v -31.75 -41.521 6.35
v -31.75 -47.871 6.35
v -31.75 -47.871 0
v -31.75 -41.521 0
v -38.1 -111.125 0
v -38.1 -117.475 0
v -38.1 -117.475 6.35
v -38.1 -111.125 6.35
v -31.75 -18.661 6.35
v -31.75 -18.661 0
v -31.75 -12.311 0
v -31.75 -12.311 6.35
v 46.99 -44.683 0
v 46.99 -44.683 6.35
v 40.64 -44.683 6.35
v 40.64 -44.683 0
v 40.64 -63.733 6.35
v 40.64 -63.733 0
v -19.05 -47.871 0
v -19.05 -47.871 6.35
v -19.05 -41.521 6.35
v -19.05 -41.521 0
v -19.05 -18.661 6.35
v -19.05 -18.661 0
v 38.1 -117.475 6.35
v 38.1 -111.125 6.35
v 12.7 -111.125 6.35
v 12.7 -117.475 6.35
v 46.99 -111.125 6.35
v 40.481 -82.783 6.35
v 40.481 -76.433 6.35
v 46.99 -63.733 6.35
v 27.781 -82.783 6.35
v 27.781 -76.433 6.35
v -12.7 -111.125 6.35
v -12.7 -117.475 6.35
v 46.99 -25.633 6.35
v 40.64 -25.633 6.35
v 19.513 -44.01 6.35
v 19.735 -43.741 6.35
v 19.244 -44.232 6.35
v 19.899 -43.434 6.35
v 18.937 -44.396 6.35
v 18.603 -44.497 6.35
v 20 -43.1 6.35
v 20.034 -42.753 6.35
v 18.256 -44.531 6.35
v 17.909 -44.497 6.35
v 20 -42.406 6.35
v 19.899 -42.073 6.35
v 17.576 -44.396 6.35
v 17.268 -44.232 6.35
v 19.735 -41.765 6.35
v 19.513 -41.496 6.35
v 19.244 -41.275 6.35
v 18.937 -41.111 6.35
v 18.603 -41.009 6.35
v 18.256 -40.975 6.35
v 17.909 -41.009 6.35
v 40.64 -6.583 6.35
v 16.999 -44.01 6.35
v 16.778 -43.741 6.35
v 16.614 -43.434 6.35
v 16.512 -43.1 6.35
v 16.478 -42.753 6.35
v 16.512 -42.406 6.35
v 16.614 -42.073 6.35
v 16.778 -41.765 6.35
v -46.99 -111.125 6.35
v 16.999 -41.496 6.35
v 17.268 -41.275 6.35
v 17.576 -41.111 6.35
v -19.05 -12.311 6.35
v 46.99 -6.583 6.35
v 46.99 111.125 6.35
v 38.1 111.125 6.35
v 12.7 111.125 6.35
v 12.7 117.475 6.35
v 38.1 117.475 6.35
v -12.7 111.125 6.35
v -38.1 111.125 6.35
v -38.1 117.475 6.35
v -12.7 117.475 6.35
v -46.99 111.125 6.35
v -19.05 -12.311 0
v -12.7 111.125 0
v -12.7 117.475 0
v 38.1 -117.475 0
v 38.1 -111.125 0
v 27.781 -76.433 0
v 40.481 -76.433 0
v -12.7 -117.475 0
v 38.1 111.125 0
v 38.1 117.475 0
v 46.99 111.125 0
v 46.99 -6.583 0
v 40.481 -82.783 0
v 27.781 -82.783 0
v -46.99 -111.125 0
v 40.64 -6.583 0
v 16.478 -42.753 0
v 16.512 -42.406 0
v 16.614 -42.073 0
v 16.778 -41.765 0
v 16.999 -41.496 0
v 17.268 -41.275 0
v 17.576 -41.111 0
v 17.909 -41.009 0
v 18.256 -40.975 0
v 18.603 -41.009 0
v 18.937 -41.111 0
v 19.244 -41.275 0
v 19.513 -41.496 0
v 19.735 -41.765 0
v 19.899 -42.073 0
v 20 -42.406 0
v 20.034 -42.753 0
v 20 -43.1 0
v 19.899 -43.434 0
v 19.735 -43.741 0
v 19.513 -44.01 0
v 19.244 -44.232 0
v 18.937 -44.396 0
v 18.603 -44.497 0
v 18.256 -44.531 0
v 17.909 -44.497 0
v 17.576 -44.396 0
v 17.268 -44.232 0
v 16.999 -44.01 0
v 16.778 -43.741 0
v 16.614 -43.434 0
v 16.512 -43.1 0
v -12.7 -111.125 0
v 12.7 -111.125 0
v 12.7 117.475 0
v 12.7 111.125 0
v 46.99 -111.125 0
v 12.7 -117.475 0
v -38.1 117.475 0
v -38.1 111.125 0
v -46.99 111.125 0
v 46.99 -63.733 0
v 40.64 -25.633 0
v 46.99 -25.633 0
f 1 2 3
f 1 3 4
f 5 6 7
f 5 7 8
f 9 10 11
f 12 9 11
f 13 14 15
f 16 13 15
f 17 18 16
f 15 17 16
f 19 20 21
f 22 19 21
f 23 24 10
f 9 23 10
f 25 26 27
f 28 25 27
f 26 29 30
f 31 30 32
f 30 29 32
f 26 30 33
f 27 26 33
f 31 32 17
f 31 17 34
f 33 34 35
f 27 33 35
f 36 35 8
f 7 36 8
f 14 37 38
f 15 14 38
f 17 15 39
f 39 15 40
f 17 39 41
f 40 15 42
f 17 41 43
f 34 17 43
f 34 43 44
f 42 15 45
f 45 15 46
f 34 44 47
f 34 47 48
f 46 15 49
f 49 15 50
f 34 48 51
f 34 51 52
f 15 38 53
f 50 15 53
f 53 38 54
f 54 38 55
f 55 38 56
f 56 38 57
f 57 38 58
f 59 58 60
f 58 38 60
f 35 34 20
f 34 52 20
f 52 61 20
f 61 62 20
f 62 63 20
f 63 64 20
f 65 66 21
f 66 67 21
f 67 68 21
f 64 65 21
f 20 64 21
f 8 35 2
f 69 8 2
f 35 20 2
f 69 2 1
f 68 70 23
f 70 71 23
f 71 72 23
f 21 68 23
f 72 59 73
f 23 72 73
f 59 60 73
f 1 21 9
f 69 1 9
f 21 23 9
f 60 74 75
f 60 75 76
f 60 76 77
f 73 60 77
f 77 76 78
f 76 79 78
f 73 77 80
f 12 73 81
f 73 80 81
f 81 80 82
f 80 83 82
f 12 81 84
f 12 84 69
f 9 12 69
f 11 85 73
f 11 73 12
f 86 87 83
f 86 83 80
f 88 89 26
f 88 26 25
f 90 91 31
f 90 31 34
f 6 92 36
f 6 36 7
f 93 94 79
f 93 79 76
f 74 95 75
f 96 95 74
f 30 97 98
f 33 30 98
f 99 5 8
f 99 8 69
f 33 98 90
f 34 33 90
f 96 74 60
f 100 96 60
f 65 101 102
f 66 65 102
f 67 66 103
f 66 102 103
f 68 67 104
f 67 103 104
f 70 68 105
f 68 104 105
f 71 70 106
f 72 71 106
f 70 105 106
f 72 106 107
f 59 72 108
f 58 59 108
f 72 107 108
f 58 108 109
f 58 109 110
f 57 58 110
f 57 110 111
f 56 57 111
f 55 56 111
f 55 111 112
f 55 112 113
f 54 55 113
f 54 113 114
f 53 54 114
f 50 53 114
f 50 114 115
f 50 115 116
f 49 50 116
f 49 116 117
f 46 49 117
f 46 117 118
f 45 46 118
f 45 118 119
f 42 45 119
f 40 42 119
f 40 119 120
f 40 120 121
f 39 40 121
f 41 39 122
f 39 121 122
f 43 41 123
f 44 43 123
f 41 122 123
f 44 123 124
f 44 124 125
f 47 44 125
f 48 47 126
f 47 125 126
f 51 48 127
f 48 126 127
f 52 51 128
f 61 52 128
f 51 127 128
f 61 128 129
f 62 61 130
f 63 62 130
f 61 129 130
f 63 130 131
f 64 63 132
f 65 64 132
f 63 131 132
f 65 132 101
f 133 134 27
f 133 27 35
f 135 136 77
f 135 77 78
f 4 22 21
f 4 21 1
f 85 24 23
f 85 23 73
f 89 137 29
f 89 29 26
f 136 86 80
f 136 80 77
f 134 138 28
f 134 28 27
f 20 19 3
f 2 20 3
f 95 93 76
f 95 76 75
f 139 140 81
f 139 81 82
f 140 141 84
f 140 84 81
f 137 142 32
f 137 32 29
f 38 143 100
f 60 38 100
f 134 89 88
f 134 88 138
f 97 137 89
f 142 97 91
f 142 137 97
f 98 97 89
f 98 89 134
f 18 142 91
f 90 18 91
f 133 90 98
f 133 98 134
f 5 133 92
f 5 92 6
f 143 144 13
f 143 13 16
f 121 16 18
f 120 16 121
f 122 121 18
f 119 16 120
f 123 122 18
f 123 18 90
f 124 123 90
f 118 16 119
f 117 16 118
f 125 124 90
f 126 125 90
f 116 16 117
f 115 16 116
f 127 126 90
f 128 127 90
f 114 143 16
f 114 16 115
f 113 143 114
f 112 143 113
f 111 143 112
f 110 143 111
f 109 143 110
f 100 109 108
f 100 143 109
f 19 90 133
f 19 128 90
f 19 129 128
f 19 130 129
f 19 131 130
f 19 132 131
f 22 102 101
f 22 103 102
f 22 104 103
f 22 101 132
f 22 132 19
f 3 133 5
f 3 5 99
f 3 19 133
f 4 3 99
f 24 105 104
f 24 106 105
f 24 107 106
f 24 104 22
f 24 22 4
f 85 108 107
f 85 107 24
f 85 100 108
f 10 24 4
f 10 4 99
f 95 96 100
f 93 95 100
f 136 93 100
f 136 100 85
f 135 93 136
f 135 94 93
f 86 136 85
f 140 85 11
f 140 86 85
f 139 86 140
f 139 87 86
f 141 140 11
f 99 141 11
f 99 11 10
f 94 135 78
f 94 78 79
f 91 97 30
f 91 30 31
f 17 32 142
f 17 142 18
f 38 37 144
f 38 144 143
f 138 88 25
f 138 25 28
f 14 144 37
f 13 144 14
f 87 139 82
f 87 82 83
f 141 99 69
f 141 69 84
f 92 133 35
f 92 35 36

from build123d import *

# Parameters (mm, degrees)
BOSS_EXTRUDE1_DEPTH = 6.35
SKETCH2_W           = 6.35
SKETCH2_H           = 19.05
SKETCH2_W_2         = 12.7
SKETCH2_H_2         = 6.35
SKETCH2_R           = 1.778
CUT_EXTRUDE1_DEPTH  = 127.683693603


with BuildPart() as part:
    # Sketch1 → Boss-Extrude1 (new body)
    with BuildSketch(Plane.XY):
        Polygon((-46.99, 111.125), (-38.1, 111.125), (-38.1, 117.475), (-12.7, 117.475), (-12.7, 111.125), (12.7, 111.125), (12.7, 117.475), (38.1, 117.475), (38.1, 111.125), (46.99, 111.125), (46.99, -111.125), (38.1, -111.125), (38.1, -117.475), (12.7, -117.475), (12.7, -111.125), (-12.7, -111.125), (-12.7, -117.475), (-38.1, -117.475), (-38.1, -111.125), (-46.99, -111.125), align=None)
    extrude(amount=BOSS_EXTRUDE1_DEPTH)

    # Sketch2 → Cut-Extrude1 (cut, through all)
    with BuildSketch(Plane(origin=(0, 0, 0), x_dir=(-1, 0, 0), z_dir=(0, 0, -1))):
        with Locations((-43.815, -54.2076454)):
            Rectangle(SKETCH2_W, SKETCH2_H)
        with Locations((-43.815, -16.1076454)):
            Rectangle(SKETCH2_W, SKETCH2_H)
        with Locations((-34.13125, -79.6076454)):
            Rectangle(SKETCH2_W_2, SKETCH2_H_2)
        with Locations((25.4, -15.485506714)):
            Rectangle(SKETCH2_W_2, SKETCH2_H_2)
        with Locations((25.4, -44.695506714)):
            Rectangle(SKETCH2_W_2, SKETCH2_H_2)
        with Locations((-18.25625, -42.753213284)):
            Circle(SKETCH2_R)
    extrude(amount=-CUT_EXTRUDE1_DEPTH, mode=Mode.SUBTRACT)


solid = part.part
